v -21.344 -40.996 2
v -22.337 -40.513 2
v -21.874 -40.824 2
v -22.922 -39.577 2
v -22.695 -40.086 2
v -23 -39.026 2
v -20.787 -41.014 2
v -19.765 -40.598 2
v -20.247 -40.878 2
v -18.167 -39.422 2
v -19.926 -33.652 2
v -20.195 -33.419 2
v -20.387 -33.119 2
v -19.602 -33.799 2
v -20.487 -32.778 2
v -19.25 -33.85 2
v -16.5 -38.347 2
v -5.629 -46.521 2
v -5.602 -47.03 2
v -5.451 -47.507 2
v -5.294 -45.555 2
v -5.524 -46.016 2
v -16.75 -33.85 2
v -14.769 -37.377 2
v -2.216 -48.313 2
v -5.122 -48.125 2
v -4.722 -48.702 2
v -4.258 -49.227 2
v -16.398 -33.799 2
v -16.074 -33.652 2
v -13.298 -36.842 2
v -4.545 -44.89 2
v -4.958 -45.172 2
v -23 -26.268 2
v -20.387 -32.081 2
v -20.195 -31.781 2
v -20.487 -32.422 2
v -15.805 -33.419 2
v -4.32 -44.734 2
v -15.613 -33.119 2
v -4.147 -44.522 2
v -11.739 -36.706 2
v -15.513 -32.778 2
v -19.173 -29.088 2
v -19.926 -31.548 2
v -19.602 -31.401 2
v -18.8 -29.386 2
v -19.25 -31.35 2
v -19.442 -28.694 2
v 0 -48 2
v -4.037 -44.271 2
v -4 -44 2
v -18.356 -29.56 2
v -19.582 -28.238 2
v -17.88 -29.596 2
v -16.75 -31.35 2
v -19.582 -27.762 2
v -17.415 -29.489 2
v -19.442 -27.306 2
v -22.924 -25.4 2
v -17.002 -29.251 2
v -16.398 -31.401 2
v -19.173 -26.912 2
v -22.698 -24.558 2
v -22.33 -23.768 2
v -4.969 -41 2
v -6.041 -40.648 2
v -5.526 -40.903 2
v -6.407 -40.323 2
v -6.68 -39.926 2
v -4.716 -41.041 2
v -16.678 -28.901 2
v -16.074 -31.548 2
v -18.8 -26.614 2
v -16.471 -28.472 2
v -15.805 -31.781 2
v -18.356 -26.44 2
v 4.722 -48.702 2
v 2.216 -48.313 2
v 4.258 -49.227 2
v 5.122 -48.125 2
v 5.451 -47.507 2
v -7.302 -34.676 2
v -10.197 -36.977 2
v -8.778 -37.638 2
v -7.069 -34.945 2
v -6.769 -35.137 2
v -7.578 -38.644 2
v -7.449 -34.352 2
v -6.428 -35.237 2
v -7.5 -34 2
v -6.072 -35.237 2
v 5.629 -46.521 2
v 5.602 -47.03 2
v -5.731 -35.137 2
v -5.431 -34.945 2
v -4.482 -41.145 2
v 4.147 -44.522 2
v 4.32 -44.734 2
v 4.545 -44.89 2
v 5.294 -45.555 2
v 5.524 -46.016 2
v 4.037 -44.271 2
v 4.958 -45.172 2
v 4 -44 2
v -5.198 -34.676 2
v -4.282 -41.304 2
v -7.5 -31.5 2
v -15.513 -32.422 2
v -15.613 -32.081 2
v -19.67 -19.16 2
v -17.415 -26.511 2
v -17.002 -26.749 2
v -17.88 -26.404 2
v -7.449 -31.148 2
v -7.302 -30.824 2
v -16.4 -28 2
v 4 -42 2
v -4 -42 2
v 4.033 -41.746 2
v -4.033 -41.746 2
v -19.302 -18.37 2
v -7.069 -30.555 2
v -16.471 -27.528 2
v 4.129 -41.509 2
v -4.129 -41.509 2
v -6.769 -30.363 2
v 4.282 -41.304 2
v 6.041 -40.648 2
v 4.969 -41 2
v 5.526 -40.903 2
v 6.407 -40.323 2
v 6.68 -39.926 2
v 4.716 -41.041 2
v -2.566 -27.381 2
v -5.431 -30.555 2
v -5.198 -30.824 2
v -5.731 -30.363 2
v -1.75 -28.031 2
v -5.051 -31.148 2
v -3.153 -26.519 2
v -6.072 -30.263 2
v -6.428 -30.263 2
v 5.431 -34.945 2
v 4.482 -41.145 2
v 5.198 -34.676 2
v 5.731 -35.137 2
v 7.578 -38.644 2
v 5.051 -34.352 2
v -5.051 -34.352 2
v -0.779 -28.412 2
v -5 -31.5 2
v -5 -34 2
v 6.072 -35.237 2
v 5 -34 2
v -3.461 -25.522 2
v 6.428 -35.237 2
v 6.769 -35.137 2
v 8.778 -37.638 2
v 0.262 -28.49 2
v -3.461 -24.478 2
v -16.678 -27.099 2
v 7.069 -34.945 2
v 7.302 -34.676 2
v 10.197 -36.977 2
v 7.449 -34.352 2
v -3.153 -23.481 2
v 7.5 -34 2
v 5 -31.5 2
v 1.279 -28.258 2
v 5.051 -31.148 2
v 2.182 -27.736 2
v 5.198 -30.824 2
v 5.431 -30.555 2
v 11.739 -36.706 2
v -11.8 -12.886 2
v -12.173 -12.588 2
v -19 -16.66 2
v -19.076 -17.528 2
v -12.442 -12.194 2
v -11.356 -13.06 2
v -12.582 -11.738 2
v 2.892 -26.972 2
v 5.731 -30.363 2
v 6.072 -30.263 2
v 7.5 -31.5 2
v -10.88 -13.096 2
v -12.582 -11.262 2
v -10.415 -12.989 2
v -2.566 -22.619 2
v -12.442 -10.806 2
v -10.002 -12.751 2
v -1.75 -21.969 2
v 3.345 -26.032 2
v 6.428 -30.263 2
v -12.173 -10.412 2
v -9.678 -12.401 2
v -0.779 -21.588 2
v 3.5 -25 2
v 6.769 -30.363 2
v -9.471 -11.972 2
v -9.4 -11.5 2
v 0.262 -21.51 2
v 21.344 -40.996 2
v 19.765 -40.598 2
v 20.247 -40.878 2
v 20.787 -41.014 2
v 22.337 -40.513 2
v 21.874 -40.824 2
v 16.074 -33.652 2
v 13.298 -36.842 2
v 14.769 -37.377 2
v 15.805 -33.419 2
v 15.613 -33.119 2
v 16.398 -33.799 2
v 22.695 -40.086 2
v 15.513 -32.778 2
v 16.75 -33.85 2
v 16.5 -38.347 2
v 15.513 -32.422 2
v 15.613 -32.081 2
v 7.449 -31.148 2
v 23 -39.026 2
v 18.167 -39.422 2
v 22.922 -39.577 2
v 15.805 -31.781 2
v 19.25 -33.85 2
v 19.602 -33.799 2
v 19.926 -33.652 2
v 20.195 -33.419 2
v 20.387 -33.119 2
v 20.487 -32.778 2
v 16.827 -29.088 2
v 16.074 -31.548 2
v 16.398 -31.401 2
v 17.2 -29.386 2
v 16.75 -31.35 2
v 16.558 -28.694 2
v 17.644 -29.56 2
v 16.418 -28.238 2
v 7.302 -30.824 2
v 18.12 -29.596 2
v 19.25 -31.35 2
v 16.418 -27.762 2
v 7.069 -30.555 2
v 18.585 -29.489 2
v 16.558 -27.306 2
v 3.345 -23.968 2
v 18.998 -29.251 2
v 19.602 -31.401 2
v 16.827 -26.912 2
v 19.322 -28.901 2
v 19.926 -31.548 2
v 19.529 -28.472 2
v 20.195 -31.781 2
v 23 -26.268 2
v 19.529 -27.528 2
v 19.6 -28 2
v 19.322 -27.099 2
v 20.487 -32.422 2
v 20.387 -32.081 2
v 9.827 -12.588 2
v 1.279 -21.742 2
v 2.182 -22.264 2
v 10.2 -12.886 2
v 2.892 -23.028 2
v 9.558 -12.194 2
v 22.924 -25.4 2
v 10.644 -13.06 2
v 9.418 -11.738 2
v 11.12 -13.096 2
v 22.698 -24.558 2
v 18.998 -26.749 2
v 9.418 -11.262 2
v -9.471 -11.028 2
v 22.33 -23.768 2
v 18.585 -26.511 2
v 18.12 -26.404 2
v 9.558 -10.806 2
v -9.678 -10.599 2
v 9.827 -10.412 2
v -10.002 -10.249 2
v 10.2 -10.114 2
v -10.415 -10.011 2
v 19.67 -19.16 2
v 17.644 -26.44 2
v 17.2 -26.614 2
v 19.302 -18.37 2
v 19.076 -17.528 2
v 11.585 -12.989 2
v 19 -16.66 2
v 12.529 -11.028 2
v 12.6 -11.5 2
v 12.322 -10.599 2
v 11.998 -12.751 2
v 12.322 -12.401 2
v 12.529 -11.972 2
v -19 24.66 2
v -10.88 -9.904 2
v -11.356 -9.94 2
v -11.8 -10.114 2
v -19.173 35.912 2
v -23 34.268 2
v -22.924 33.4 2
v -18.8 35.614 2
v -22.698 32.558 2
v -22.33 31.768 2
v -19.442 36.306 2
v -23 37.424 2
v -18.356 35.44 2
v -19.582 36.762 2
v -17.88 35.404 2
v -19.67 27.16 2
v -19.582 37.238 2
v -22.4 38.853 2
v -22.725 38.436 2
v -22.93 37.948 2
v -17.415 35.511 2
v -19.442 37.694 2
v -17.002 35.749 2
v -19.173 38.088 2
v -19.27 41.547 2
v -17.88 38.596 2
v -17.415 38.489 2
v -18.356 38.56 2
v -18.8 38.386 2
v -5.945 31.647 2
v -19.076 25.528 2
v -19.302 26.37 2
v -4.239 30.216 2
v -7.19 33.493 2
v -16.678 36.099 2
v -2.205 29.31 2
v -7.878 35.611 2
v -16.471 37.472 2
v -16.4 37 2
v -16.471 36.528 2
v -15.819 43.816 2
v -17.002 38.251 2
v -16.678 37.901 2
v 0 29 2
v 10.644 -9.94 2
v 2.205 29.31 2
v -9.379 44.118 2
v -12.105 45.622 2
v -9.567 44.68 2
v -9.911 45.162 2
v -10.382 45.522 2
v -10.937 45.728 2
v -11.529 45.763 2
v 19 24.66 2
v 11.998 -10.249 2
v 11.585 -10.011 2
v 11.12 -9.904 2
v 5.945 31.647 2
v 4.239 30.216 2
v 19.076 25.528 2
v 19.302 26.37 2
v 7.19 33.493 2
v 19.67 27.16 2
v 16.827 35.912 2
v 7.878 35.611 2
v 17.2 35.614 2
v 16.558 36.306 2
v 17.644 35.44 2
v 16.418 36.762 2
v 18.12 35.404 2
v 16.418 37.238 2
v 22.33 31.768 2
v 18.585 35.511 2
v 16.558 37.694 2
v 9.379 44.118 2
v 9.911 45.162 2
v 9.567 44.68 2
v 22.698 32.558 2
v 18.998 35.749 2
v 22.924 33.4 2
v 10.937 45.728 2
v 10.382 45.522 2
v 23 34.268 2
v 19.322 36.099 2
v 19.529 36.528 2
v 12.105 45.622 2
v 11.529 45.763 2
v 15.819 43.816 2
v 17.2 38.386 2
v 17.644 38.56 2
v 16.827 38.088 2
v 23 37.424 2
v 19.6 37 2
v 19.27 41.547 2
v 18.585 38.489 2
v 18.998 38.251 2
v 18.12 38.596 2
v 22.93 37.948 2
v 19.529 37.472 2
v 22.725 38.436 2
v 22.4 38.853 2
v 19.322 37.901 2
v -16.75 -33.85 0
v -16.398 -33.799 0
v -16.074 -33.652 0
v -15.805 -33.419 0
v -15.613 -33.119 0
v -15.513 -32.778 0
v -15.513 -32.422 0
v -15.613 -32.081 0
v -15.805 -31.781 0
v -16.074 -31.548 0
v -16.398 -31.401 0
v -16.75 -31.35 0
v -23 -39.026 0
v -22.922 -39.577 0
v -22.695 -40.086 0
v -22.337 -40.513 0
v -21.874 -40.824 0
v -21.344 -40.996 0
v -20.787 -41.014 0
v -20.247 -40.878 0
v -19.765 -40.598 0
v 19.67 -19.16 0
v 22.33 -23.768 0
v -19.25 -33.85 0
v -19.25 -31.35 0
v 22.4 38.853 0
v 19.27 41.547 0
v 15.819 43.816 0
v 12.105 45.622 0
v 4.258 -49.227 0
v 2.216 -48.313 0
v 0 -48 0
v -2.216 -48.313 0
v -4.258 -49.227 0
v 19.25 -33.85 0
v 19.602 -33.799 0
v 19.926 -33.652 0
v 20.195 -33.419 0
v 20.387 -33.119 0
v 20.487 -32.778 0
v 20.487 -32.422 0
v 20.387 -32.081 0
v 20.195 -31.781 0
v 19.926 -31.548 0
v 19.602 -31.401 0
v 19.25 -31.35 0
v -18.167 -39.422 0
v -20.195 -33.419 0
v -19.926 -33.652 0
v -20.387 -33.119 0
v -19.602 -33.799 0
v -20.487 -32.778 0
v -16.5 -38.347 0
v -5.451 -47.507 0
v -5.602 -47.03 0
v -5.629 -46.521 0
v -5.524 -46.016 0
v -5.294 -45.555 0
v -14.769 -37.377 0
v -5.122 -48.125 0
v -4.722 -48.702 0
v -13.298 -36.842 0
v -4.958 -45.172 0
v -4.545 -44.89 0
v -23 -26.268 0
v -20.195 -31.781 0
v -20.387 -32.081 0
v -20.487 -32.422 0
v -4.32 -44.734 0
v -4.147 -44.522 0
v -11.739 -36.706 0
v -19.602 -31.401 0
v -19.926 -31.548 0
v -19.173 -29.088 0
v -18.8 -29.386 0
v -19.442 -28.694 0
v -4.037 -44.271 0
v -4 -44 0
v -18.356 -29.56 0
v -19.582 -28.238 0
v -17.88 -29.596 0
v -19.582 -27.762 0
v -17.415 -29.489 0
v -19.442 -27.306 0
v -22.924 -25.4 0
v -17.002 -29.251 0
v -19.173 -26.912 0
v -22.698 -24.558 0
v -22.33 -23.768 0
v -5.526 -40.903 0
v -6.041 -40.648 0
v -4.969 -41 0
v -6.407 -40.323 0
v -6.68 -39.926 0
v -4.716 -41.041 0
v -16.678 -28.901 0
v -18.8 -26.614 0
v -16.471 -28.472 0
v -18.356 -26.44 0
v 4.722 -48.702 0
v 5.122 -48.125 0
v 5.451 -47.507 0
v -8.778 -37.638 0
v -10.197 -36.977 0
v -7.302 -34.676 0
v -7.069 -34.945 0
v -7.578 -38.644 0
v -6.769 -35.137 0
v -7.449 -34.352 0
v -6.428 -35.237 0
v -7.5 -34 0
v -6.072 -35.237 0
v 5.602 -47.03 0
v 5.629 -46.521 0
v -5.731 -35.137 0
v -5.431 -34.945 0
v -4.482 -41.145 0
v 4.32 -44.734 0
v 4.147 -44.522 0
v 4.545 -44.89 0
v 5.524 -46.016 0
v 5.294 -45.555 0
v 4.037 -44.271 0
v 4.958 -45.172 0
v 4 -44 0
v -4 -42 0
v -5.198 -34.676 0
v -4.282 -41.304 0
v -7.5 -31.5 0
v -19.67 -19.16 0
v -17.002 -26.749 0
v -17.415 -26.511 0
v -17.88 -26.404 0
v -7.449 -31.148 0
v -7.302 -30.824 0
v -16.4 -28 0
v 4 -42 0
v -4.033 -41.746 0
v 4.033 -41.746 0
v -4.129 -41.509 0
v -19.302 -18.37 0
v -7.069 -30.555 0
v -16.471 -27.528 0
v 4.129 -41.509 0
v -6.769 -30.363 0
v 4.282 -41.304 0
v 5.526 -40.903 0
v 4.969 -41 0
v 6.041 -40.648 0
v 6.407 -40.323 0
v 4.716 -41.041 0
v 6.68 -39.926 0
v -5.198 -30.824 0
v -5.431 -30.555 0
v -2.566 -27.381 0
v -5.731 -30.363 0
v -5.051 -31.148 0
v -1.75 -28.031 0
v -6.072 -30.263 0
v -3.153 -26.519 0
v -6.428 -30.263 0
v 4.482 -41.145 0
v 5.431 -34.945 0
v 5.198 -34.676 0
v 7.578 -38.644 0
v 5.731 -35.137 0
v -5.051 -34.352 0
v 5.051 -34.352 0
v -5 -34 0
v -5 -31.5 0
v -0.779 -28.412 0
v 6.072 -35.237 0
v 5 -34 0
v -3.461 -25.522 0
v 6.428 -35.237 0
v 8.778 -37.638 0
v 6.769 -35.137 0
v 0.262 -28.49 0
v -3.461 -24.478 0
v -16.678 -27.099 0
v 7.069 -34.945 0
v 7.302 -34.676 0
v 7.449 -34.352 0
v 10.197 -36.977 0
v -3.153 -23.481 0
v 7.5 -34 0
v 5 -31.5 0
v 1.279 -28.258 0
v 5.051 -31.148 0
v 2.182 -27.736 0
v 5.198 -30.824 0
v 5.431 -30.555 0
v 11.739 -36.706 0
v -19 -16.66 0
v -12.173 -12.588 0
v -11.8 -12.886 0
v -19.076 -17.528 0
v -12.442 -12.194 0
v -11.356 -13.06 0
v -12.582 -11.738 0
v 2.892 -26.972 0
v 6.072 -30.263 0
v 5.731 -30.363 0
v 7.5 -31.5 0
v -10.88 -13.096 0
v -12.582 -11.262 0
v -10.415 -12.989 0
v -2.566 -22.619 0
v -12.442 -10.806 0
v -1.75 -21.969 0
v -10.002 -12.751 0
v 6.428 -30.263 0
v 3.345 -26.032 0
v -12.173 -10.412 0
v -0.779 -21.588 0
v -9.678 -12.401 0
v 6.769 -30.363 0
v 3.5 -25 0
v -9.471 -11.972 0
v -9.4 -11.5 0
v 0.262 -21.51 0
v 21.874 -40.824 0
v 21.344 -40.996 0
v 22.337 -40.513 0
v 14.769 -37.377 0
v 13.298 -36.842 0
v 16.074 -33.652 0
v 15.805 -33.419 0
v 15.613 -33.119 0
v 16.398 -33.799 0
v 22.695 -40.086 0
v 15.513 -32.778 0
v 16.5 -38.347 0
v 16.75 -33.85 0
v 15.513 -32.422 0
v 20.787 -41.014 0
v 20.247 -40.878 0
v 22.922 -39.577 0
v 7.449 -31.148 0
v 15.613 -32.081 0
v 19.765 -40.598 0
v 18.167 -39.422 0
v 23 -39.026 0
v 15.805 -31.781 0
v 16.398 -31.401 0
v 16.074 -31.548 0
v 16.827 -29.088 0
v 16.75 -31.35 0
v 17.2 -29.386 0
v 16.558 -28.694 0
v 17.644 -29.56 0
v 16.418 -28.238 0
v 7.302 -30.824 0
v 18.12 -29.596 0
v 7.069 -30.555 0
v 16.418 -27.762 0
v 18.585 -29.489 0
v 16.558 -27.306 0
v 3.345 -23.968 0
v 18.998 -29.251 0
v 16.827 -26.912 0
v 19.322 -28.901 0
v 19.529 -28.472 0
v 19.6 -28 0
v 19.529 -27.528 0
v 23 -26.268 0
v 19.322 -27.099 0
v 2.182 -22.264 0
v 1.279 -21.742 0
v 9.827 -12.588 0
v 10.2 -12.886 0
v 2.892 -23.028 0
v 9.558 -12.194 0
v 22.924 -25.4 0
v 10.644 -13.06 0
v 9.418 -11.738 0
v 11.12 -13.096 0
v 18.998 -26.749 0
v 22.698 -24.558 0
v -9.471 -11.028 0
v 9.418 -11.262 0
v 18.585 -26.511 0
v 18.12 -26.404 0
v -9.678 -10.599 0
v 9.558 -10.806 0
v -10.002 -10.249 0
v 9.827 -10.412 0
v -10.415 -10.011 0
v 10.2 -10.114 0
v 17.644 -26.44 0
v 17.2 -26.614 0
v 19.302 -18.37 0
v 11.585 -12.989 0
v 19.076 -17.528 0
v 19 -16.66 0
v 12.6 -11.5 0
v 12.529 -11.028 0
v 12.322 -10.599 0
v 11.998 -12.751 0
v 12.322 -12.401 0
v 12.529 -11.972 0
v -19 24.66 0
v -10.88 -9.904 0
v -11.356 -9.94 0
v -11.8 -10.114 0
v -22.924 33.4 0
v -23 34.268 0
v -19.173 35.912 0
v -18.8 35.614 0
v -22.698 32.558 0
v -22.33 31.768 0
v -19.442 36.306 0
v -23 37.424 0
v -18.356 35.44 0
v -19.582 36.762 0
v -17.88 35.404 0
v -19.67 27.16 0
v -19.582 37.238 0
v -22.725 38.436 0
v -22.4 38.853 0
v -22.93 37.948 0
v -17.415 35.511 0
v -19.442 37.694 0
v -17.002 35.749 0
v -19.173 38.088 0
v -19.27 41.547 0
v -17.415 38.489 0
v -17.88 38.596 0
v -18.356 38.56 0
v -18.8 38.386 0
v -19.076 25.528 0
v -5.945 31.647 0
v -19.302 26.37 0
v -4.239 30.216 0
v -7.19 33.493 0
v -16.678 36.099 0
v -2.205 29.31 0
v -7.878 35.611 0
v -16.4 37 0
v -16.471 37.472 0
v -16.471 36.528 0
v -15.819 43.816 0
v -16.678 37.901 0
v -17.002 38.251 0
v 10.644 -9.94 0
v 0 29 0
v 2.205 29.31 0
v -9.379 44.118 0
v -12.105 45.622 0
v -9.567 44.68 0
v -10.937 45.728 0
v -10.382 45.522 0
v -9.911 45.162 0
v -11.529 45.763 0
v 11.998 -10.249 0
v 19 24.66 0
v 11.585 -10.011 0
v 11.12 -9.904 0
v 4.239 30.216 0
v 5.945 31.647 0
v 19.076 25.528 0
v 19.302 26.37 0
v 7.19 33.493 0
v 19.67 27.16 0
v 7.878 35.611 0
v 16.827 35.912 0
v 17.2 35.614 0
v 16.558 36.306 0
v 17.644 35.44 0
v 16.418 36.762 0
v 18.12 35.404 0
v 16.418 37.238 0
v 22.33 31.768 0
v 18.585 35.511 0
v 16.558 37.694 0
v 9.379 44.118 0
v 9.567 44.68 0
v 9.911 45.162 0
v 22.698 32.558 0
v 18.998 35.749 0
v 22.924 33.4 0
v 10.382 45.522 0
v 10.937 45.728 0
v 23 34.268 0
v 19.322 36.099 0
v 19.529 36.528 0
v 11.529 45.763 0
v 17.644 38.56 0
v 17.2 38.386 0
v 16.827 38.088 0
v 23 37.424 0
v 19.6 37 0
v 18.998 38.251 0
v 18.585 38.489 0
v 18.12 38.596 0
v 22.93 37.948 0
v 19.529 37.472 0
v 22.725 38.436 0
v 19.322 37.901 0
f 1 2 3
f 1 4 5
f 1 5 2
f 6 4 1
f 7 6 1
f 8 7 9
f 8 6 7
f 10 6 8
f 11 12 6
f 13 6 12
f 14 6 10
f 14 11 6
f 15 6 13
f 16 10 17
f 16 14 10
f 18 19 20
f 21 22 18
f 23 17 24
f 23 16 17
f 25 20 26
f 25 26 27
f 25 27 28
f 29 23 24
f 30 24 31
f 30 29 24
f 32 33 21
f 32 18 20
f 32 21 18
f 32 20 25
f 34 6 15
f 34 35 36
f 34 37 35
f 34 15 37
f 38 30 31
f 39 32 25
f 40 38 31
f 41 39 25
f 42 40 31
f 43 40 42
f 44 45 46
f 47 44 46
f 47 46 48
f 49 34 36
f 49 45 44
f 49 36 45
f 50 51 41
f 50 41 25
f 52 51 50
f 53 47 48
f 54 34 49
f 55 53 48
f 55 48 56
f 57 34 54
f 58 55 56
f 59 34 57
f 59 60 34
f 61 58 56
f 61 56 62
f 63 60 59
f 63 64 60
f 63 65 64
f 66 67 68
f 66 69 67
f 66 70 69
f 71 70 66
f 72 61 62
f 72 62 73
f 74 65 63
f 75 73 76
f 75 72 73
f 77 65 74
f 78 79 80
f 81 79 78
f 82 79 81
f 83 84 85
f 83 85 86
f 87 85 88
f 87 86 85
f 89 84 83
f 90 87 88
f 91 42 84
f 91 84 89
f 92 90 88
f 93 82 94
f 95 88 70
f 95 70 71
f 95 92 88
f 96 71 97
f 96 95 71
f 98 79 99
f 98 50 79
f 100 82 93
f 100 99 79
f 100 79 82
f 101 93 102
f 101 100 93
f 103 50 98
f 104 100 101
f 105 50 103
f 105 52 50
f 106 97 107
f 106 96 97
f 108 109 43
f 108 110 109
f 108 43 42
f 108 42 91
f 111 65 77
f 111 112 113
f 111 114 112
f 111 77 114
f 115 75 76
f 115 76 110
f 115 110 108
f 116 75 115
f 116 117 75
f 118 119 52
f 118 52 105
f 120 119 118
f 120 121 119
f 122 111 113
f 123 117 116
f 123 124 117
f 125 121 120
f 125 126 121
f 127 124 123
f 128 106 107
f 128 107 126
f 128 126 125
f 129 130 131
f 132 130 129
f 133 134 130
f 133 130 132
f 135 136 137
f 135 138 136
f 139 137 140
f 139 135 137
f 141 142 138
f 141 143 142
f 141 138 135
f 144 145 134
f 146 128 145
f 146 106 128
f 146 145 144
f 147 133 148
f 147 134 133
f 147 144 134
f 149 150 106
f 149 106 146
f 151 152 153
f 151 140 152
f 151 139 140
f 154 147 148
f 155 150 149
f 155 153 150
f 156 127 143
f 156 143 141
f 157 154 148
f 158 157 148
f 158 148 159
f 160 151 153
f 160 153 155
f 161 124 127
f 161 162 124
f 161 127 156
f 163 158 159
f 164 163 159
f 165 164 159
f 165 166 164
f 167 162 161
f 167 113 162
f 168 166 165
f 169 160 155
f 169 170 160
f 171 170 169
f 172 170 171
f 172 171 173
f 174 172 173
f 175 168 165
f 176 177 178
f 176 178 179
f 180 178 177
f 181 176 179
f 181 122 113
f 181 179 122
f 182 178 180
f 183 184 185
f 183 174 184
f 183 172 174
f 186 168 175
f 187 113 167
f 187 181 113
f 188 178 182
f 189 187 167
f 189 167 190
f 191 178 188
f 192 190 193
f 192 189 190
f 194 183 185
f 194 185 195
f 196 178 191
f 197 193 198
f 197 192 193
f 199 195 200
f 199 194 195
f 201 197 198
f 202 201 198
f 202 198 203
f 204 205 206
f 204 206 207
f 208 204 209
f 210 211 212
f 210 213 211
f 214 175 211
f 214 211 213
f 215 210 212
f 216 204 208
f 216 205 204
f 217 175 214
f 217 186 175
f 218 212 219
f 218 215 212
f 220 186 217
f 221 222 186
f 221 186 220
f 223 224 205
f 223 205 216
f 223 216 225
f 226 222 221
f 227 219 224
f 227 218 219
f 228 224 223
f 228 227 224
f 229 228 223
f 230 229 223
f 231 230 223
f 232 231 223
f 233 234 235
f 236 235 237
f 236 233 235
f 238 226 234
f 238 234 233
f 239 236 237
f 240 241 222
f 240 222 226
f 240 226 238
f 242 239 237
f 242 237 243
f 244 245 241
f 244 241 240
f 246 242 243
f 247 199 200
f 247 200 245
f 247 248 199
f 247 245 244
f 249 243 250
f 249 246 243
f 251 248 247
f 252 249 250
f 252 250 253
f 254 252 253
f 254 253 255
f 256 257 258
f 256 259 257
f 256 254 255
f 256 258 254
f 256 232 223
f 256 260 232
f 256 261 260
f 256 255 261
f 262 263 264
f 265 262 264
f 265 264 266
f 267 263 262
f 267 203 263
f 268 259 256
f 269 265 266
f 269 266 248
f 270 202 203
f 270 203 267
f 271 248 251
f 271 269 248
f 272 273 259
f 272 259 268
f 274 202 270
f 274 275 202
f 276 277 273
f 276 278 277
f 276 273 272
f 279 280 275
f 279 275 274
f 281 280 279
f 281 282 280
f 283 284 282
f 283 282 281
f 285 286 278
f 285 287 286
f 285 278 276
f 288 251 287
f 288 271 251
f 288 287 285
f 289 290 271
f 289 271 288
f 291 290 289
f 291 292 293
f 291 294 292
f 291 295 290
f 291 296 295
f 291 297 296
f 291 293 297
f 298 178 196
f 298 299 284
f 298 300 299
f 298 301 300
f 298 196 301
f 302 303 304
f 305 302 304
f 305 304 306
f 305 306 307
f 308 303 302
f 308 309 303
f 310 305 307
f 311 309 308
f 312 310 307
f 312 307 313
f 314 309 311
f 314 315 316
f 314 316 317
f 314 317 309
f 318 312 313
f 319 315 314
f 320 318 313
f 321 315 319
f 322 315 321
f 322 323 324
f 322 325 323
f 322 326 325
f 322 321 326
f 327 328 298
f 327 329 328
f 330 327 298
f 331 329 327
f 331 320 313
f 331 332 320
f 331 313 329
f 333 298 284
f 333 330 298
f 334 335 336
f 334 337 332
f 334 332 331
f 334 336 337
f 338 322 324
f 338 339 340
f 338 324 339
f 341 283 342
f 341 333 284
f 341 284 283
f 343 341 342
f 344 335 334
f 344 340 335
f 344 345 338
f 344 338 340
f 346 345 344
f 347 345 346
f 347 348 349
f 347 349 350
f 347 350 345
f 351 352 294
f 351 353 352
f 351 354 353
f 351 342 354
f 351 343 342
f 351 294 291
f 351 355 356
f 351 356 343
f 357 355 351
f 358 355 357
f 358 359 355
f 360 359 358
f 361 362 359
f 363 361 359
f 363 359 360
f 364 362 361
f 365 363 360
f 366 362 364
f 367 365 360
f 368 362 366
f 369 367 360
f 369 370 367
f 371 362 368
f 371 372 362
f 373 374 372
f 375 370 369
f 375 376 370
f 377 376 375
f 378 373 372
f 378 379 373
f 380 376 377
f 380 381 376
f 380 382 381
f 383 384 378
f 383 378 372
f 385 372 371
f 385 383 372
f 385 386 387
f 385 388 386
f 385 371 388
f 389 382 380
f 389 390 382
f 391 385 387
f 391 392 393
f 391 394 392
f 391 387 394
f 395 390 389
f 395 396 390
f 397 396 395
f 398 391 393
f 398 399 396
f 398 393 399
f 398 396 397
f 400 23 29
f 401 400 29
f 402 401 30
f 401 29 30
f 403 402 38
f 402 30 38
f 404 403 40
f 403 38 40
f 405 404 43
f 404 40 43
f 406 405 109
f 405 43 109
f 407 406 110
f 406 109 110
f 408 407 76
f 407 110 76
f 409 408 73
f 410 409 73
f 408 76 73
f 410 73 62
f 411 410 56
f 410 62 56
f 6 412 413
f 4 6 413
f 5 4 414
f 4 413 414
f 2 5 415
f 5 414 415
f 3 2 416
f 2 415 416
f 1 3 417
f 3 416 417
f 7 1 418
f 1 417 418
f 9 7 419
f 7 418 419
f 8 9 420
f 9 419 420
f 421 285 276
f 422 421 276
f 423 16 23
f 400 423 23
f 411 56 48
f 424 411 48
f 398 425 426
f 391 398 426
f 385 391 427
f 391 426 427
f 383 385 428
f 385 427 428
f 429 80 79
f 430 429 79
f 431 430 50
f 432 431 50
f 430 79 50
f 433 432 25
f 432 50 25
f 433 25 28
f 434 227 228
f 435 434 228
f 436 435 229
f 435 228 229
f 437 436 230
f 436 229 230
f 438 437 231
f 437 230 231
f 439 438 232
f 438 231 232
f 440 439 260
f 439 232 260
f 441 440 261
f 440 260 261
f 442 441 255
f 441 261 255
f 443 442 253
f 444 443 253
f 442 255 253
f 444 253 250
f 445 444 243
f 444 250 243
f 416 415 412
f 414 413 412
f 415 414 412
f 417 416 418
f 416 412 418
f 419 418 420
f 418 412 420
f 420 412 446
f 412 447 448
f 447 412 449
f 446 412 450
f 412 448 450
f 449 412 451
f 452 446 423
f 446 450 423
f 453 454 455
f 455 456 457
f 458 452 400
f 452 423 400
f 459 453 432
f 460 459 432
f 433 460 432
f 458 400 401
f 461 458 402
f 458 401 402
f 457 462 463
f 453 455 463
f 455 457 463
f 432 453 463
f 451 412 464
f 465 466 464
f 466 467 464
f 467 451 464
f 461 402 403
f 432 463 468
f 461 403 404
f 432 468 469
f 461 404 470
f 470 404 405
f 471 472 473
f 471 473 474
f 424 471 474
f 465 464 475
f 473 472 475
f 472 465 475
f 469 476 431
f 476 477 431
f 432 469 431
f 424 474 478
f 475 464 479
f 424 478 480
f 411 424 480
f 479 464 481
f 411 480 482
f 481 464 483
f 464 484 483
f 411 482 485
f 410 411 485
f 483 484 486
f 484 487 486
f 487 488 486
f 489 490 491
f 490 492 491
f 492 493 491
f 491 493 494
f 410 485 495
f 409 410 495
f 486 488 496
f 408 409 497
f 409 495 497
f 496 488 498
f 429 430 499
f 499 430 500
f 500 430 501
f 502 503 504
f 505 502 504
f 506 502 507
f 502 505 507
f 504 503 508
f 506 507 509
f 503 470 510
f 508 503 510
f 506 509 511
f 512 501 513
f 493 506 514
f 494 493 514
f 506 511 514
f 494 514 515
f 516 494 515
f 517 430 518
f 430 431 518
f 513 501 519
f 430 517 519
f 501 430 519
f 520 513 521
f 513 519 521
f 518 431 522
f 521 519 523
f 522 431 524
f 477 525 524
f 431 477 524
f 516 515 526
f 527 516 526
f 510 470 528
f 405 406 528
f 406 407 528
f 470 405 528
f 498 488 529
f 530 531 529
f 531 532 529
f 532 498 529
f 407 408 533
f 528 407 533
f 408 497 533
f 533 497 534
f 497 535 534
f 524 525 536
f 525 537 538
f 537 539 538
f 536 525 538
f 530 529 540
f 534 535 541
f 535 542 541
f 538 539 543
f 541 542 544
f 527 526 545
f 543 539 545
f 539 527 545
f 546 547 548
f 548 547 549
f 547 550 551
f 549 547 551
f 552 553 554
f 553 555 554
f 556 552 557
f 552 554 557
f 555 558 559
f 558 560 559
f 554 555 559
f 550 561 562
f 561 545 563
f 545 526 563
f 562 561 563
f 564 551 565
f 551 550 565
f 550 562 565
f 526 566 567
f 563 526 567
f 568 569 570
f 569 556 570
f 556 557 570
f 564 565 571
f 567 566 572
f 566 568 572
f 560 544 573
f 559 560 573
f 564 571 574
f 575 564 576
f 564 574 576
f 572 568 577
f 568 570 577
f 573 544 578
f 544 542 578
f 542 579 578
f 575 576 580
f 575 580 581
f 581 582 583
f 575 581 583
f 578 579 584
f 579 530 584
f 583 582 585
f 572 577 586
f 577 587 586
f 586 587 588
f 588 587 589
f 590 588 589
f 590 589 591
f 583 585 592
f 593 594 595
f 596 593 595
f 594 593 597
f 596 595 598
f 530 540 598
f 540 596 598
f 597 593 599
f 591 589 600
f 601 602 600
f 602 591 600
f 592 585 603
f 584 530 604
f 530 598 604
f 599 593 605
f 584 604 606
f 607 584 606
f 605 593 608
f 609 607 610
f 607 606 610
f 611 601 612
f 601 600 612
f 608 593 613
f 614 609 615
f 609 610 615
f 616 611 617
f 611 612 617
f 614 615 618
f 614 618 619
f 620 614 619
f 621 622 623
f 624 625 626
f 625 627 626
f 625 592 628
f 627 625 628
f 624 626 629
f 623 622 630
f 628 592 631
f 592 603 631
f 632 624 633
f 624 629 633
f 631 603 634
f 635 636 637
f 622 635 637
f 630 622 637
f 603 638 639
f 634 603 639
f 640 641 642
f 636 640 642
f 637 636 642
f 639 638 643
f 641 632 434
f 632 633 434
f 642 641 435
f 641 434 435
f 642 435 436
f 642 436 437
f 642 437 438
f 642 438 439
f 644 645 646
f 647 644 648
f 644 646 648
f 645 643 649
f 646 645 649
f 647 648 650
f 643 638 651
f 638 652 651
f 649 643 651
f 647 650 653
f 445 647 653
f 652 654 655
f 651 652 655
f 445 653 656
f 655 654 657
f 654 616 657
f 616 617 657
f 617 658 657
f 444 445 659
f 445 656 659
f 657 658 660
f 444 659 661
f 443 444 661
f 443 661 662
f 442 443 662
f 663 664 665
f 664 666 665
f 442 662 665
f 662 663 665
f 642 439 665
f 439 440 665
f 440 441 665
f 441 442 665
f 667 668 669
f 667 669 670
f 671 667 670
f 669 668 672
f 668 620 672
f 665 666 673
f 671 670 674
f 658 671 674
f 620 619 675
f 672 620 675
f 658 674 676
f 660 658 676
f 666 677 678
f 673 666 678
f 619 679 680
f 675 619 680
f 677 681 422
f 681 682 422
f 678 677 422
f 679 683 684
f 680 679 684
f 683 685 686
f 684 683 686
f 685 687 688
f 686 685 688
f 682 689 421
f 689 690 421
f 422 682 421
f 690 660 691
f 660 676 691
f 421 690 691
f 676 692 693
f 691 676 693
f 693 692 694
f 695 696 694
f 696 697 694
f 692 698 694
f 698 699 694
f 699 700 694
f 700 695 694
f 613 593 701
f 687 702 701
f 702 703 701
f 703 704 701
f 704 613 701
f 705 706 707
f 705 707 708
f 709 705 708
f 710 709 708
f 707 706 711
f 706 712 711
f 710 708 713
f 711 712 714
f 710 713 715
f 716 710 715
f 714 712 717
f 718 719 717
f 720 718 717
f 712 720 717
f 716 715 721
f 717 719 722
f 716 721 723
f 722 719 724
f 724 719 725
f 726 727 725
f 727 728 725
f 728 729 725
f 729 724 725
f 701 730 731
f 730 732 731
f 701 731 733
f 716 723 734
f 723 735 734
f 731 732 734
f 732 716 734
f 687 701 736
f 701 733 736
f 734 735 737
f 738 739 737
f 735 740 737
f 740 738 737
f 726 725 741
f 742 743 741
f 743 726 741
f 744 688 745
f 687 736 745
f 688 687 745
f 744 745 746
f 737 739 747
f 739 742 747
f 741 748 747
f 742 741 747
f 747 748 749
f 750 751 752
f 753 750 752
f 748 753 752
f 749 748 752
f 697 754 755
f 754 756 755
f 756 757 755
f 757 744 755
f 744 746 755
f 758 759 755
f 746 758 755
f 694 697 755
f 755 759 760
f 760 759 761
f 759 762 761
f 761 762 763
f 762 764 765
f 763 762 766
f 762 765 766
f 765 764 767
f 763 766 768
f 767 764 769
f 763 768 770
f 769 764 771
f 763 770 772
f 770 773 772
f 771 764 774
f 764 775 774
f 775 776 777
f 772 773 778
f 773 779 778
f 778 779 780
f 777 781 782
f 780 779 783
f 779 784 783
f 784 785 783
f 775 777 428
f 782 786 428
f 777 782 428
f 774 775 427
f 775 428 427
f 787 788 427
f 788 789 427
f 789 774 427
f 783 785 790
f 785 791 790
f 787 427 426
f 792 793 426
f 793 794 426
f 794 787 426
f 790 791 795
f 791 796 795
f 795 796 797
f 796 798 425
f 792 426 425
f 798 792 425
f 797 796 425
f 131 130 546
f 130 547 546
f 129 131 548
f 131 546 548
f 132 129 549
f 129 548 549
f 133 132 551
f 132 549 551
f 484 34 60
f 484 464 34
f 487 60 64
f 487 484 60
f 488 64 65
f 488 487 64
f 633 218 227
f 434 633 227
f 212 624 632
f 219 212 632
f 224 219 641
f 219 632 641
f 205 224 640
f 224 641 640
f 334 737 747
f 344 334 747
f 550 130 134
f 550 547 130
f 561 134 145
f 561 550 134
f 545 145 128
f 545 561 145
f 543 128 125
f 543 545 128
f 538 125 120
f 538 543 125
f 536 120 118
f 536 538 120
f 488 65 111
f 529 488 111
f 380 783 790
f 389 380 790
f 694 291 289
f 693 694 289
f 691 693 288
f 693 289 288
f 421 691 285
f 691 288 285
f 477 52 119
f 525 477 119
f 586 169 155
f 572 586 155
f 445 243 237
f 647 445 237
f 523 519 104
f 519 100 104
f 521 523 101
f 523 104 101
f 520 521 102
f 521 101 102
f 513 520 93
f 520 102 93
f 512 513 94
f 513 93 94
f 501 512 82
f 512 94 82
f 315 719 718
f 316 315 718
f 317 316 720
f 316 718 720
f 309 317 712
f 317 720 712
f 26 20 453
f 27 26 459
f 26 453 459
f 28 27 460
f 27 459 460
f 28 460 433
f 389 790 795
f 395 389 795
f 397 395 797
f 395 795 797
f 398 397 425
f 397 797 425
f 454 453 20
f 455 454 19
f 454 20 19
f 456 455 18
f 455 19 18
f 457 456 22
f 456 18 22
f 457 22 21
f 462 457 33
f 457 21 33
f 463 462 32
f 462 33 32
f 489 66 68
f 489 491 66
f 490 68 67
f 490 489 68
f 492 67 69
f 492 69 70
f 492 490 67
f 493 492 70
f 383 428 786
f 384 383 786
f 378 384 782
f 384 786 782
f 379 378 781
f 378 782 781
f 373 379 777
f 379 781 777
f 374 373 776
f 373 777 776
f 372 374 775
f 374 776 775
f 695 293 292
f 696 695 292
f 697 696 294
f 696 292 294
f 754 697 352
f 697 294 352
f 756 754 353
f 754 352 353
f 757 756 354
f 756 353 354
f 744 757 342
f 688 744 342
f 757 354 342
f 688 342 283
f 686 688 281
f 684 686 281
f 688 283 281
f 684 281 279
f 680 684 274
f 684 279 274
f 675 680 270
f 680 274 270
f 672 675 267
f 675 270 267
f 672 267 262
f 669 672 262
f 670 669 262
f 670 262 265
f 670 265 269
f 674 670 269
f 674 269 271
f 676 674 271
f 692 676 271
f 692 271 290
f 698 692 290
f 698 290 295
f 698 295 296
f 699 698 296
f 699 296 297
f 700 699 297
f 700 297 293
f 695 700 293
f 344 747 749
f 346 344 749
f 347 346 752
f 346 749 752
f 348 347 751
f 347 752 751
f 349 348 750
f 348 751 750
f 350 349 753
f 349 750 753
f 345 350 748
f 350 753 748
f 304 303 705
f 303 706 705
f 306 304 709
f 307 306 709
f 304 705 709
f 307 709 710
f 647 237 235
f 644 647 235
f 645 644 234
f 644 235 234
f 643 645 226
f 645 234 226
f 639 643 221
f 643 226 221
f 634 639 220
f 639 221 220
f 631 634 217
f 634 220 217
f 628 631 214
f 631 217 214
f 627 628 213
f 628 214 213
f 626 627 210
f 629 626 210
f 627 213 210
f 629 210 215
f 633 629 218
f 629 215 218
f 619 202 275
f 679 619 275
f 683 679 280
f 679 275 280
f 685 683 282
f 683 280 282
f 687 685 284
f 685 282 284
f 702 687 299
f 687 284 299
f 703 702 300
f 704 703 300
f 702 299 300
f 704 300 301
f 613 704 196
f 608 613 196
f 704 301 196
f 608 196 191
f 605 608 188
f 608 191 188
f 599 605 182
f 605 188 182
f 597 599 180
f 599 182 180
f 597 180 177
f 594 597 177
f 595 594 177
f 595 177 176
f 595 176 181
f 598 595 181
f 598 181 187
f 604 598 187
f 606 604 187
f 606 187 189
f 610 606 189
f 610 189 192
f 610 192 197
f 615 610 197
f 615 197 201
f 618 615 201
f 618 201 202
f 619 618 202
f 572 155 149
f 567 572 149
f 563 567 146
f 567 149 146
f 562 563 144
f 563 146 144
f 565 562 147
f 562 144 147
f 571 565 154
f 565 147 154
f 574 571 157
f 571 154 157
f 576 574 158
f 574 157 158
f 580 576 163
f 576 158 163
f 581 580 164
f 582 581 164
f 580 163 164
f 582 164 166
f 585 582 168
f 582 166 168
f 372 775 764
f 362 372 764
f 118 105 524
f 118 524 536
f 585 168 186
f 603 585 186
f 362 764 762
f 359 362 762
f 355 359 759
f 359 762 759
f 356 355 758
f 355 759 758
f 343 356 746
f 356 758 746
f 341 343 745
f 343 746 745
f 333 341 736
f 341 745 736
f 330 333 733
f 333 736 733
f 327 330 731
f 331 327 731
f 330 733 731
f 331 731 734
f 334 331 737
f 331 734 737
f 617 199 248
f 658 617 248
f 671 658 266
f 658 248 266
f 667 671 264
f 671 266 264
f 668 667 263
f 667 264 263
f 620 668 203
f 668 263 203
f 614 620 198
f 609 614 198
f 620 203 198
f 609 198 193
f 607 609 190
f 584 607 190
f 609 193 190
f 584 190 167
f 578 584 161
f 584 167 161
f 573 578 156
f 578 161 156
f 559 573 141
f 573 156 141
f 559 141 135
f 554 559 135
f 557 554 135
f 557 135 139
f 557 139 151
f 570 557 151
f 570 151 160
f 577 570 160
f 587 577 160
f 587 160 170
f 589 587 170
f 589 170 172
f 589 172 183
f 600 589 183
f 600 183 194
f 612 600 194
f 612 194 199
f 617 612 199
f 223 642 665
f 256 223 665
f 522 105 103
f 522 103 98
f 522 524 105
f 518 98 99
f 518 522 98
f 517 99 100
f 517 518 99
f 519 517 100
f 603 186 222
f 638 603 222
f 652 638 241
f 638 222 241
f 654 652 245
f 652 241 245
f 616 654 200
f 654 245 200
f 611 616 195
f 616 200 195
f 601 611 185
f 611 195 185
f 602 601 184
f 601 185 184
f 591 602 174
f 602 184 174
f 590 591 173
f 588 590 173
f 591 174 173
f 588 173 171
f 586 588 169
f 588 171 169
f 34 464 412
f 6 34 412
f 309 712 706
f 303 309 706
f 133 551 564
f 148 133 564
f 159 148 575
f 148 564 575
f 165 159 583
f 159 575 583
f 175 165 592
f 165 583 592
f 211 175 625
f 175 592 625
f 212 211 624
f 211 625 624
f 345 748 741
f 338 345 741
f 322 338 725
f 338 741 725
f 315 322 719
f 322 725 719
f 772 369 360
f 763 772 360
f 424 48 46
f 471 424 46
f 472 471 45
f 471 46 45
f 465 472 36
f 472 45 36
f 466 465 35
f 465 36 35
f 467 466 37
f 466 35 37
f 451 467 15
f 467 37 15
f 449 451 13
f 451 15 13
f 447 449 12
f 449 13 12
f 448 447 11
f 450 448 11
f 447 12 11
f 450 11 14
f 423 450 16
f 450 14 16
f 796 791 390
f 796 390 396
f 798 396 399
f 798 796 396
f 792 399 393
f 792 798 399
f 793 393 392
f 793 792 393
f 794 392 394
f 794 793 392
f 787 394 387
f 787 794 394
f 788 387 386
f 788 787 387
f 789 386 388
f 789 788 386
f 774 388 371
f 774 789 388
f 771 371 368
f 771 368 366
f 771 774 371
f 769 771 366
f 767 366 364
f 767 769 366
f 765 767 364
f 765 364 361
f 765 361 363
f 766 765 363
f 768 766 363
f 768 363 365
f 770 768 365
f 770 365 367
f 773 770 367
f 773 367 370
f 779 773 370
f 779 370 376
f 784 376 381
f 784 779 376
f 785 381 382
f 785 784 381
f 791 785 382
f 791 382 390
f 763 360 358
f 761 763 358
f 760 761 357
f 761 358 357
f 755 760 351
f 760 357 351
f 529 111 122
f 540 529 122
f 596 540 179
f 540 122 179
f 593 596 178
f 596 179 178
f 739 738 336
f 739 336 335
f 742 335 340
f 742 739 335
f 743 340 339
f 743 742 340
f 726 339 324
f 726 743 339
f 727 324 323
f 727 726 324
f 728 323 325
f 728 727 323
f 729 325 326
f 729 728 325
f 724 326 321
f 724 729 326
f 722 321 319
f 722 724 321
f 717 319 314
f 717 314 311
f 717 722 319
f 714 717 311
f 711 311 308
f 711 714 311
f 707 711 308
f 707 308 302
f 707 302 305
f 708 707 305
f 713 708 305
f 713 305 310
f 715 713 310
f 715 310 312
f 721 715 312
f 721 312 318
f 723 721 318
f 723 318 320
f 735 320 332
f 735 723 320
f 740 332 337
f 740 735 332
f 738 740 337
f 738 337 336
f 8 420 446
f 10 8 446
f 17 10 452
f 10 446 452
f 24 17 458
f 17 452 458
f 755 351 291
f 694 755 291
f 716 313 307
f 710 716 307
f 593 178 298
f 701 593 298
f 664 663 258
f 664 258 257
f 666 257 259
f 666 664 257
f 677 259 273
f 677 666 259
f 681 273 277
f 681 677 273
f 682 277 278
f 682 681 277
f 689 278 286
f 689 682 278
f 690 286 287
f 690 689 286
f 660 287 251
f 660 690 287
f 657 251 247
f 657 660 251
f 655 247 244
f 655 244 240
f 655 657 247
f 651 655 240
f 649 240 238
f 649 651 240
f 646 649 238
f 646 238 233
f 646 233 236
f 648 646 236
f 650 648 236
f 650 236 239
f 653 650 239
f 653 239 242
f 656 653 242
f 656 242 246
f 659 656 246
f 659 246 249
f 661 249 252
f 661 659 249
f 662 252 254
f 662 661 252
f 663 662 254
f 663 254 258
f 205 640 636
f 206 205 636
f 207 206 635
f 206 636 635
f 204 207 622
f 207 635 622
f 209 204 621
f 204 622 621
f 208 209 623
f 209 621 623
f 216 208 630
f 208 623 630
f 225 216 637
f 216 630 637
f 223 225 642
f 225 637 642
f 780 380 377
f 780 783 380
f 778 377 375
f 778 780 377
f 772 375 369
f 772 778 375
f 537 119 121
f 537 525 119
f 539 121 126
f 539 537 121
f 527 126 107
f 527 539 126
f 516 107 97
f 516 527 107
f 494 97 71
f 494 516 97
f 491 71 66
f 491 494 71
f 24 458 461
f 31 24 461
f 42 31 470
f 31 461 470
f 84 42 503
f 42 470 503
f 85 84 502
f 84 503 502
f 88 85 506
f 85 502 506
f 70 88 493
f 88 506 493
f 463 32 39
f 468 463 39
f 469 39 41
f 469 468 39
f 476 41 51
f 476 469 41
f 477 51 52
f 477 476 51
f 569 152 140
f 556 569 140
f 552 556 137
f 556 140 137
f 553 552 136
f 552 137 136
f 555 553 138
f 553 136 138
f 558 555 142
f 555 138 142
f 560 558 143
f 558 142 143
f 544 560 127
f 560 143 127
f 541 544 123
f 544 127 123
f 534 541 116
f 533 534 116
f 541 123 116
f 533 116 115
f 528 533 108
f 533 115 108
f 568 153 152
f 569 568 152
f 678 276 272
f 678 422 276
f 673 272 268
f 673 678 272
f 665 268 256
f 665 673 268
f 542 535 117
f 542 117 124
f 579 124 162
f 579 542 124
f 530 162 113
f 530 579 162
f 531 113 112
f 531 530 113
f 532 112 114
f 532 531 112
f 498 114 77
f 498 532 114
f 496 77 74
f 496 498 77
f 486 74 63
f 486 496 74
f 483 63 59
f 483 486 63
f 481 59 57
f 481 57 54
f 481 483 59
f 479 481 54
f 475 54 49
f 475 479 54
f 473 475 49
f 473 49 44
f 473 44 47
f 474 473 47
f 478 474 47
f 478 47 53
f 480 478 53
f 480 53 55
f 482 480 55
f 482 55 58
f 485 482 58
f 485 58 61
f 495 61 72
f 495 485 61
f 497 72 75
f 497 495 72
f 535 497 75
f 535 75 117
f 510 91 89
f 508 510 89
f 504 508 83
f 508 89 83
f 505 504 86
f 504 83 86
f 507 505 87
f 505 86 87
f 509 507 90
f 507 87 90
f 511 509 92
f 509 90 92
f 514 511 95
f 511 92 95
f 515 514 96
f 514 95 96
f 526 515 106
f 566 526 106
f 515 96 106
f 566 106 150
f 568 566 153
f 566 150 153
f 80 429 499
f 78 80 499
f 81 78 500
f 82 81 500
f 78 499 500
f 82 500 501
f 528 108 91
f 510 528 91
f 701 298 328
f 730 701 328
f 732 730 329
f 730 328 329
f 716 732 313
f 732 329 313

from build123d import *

# Parameters (mm, degrees)
F0_R      = 1.6
F1_DEPTH  = 2
F2_W      = 6
F2_H      = 4
F2_R      = 1.6
F2_R_2    = 3.5
F2_R_3    = 8
F3_DEPTH  = 2.001
F5_DEPTH  = 2.001
F6_R      = 5
F7_R      = 1
F8_R      = 2
F10_DEPTH = 2.0010001


with BuildPart() as f1:
    # F0 (on Top) → F1 (new body)
    with BuildSketch(Plane.XY):
        with BuildLine():
            ThreePointArc((-22.4, 38.8525709713), (-22.8439088915, 38.1988819549), (-23, 37.4242852856))
            Line((-23, 37.4242852856), (-23, -39.0255160858))
            ThreePointArc((-23, -39.0255160858), (-21.8744746322, -40.8242084212), (-19.7647058824, -40.5984269042))
            ThreePointArc((-19.7647058824, -40.5984269042), (-17.3419245059, -38.8715499716), (-14.7692307692, -37.3771536131))
            ThreePointArc((-14.7692307692, -37.3771536131), (-8.88675287, -37.5707723251), (-6, -42.6998748107))
            Line((-6, -42.6998748107), (-6, -45))
            ThreePointArc((-6, -45), (0, -51), (6, -45))
            Line((6, -45), (6, -42.6998748107))
            ThreePointArc((6, -42.6998748107), (8.88675287, -37.5707723251), (14.7692307692, -37.3771536131))
            ThreePointArc((14.7692307692, -37.3771536131), (17.3419245059, -38.8715499716), (19.7647058824, -40.5984269042))
            ThreePointArc((19.7647058824, -40.5984269042), (21.8744746322, -40.8242084212), (23, -39.0255160858))
            Line((23, -39.0255160858), (23, 37.4242852856))
            ThreePointArc((23, 37.4242852856), (22.8439088915, 38.1988819549), (22.4, 38.8525709713))
            ThreePointArc((22.4, 38.8525709713), (17.5812540395, 42.7376047244), (12.1046910387, 45.6222290663))
            ThreePointArc((12.1046910387, 45.6222290663), (10.3819905013, 45.5219936492), (9.3785323428, 44.118136105))
            Line((9.3785323428, 44.118136105), (7.8784620241, 35.6108145787))
            ThreePointArc((7.8784620241, 35.6108145787), (0, 29), (-7.8784620241, 35.6108145787))
            Line((-7.8784620241, 35.6108145787), (-9.3785323428, 44.118136105))
            ThreePointArc((-9.3785323428, 44.118136105), (-10.3819905013, 45.5219936492), (-12.1046910387, 45.6222290663))
            ThreePointArc((-12.1046910387, 45.6222290663), (-17.5812540395, 42.7376047244), (-22.4, 38.8525709713))
        make_face()
        with Locations((-18, -28)):
            Circle(F0_R, mode=Mode.SUBTRACT)
        with Locations((18, -28)):
            Circle(F0_R, mode=Mode.SUBTRACT)
        with Locations((-18, 37)):
            Circle(F0_R, mode=Mode.SUBTRACT)
        with Locations((18, 37)):
            Circle(F0_R, mode=Mode.SUBTRACT)
    extrude(amount=F1_DEPTH)

    # F2 (on face) → F3 (cut, through all)
    with BuildSketch(Plane.XY.offset(2)):
        with Locations((-7, -43)):
            Rectangle(F2_W, F2_H)
        with Locations((7, -43)):
            Rectangle(F2_W, F2_H)
        with BuildLine():
            Line((-5, -34), (-5, -31.5))
            ThreePointArc((-5, -31.5), (-6.25, -30.25), (-7.5, -31.5))
            Line((-7.5, -31.5), (-7.5, -34))
            ThreePointArc((-7.5, -34), (-6.25, -35.25), (-5, -34))
        make_face()
        with BuildLine():
            ThreePointArc((7.5, -31.5), (6.25, -30.25), (5, -31.5))
            Line((5, -31.5), (5, -34))
            ThreePointArc((5, -34), (6.25, -35.25), (7.5, -34))
            Line((7.5, -34), (7.5, -31.5))
        make_face()
        with Locations((-11, -11.5)):
            Circle(F2_R)
        with Locations((11, -11.5)):
            Circle(F2_R)
        with Locations((0, -25)):
            Circle(F2_R_2)
        with Locations((0, -56)):
            Circle(F2_R_3)
    extrude(amount=-F3_DEPTH, mode=Mode.SUBTRACT)

    # F4 (on face) → F5 (cut, through all)
    with BuildSketch(Plane.XY.offset(2)):
        with BuildLine():
            Line((-19, -16.6602540378), (-19, 24.6602540378))
            ThreePointArc((-19, 24.6602540378), (-19.1703708686, 25.9543492634), (-19.6698729811, 27.1602540378))
            Line((-19.6698729811, 27.1602540378), (-23, 32.9282032303))
            Line((-23, 32.9282032303), (-23, -24.9282032303))
            Line((-23, -24.9282032303), (-19.6698729811, -19.1602540378))
            ThreePointArc((-19.6698729811, -19.1602540378), (-19.1703708686, -17.9543492634), (-19, -16.6602540378))
        make_face()
        with BuildLine():
            ThreePointArc((19.6698729811, 27.1602540378), (19.1703708686, 25.9543492634), (19, 24.6602540378))
            Line((19, 24.6602540378), (19, -16.6602540378))
            ThreePointArc((19, -16.6602540378), (19.1703708686, -17.9543492634), (19.6698729811, -19.1602540378))
            Line((19.6698729811, -19.1602540378), (23, -24.9282032303))
            Line((23, -24.9282032303), (23, 32.9282032303))
            Line((23, 32.9282032303), (19.6698729811, 27.1602540378))
        make_face()
    extrude(amount=-F5_DEPTH, mode=Mode.SUBTRACT)

    # F6
    f6_edges = [f1.edges().sort_by_distance(p)[0] for p in [
        (-23, 32.928203, 1),
        (23, 32.928203, 1),
        (23, -24.928203, 1),
        (-23, -24.928203, 1),
    ]]
    fillet(f6_edges, radius=F6_R)

    # F7
    f7_edges = [f1.edges().sort_by_distance(p)[0] for p in [
        (-4, -41, 1),
        (-4, -45, 1),
        (4, -41, 1),
        (4, -45, 1),
    ]]
    fillet(f7_edges, radius=F7_R)

    # F8
    f8_edges = [f1.edges().sort_by_distance(p)[0] for p in [
        (-6.245834, -41, 1),
        (6.245834, -41, 1),
        (-6, -45, 1),
        (6, -45, 1),
    ]]
    fillet(f8_edges, radius=F8_R)

    # F9 (on face) → F10 (cut, through all)
    with BuildSketch(Plane.XY.offset(2)):
        with BuildLine():
            ThreePointArc((-16.75, -33.85), (-15.5, -32.6), (-16.75, -31.35))
            Line((-16.75, -31.35), (-19.25, -31.35))
            ThreePointArc((-19.25, -31.35), (-20.5, -32.6), (-19.25, -33.85))
            Line((-19.25, -33.85), (-16.75, -33.85))
        make_face()
        with BuildLine():
            Line((19.25, -31.35), (16.75, -31.35))
            ThreePointArc((16.75, -31.35), (15.5, -32.6), (16.75, -33.85))
            Line((16.75, -33.85), (19.25, -33.85))
            ThreePointArc((19.25, -33.85), (20.5, -32.6), (19.25, -31.35))
        make_face()
    extrude(amount=-F10_DEPTH, mode=Mode.SUBTRACT)


solid = f1.part
